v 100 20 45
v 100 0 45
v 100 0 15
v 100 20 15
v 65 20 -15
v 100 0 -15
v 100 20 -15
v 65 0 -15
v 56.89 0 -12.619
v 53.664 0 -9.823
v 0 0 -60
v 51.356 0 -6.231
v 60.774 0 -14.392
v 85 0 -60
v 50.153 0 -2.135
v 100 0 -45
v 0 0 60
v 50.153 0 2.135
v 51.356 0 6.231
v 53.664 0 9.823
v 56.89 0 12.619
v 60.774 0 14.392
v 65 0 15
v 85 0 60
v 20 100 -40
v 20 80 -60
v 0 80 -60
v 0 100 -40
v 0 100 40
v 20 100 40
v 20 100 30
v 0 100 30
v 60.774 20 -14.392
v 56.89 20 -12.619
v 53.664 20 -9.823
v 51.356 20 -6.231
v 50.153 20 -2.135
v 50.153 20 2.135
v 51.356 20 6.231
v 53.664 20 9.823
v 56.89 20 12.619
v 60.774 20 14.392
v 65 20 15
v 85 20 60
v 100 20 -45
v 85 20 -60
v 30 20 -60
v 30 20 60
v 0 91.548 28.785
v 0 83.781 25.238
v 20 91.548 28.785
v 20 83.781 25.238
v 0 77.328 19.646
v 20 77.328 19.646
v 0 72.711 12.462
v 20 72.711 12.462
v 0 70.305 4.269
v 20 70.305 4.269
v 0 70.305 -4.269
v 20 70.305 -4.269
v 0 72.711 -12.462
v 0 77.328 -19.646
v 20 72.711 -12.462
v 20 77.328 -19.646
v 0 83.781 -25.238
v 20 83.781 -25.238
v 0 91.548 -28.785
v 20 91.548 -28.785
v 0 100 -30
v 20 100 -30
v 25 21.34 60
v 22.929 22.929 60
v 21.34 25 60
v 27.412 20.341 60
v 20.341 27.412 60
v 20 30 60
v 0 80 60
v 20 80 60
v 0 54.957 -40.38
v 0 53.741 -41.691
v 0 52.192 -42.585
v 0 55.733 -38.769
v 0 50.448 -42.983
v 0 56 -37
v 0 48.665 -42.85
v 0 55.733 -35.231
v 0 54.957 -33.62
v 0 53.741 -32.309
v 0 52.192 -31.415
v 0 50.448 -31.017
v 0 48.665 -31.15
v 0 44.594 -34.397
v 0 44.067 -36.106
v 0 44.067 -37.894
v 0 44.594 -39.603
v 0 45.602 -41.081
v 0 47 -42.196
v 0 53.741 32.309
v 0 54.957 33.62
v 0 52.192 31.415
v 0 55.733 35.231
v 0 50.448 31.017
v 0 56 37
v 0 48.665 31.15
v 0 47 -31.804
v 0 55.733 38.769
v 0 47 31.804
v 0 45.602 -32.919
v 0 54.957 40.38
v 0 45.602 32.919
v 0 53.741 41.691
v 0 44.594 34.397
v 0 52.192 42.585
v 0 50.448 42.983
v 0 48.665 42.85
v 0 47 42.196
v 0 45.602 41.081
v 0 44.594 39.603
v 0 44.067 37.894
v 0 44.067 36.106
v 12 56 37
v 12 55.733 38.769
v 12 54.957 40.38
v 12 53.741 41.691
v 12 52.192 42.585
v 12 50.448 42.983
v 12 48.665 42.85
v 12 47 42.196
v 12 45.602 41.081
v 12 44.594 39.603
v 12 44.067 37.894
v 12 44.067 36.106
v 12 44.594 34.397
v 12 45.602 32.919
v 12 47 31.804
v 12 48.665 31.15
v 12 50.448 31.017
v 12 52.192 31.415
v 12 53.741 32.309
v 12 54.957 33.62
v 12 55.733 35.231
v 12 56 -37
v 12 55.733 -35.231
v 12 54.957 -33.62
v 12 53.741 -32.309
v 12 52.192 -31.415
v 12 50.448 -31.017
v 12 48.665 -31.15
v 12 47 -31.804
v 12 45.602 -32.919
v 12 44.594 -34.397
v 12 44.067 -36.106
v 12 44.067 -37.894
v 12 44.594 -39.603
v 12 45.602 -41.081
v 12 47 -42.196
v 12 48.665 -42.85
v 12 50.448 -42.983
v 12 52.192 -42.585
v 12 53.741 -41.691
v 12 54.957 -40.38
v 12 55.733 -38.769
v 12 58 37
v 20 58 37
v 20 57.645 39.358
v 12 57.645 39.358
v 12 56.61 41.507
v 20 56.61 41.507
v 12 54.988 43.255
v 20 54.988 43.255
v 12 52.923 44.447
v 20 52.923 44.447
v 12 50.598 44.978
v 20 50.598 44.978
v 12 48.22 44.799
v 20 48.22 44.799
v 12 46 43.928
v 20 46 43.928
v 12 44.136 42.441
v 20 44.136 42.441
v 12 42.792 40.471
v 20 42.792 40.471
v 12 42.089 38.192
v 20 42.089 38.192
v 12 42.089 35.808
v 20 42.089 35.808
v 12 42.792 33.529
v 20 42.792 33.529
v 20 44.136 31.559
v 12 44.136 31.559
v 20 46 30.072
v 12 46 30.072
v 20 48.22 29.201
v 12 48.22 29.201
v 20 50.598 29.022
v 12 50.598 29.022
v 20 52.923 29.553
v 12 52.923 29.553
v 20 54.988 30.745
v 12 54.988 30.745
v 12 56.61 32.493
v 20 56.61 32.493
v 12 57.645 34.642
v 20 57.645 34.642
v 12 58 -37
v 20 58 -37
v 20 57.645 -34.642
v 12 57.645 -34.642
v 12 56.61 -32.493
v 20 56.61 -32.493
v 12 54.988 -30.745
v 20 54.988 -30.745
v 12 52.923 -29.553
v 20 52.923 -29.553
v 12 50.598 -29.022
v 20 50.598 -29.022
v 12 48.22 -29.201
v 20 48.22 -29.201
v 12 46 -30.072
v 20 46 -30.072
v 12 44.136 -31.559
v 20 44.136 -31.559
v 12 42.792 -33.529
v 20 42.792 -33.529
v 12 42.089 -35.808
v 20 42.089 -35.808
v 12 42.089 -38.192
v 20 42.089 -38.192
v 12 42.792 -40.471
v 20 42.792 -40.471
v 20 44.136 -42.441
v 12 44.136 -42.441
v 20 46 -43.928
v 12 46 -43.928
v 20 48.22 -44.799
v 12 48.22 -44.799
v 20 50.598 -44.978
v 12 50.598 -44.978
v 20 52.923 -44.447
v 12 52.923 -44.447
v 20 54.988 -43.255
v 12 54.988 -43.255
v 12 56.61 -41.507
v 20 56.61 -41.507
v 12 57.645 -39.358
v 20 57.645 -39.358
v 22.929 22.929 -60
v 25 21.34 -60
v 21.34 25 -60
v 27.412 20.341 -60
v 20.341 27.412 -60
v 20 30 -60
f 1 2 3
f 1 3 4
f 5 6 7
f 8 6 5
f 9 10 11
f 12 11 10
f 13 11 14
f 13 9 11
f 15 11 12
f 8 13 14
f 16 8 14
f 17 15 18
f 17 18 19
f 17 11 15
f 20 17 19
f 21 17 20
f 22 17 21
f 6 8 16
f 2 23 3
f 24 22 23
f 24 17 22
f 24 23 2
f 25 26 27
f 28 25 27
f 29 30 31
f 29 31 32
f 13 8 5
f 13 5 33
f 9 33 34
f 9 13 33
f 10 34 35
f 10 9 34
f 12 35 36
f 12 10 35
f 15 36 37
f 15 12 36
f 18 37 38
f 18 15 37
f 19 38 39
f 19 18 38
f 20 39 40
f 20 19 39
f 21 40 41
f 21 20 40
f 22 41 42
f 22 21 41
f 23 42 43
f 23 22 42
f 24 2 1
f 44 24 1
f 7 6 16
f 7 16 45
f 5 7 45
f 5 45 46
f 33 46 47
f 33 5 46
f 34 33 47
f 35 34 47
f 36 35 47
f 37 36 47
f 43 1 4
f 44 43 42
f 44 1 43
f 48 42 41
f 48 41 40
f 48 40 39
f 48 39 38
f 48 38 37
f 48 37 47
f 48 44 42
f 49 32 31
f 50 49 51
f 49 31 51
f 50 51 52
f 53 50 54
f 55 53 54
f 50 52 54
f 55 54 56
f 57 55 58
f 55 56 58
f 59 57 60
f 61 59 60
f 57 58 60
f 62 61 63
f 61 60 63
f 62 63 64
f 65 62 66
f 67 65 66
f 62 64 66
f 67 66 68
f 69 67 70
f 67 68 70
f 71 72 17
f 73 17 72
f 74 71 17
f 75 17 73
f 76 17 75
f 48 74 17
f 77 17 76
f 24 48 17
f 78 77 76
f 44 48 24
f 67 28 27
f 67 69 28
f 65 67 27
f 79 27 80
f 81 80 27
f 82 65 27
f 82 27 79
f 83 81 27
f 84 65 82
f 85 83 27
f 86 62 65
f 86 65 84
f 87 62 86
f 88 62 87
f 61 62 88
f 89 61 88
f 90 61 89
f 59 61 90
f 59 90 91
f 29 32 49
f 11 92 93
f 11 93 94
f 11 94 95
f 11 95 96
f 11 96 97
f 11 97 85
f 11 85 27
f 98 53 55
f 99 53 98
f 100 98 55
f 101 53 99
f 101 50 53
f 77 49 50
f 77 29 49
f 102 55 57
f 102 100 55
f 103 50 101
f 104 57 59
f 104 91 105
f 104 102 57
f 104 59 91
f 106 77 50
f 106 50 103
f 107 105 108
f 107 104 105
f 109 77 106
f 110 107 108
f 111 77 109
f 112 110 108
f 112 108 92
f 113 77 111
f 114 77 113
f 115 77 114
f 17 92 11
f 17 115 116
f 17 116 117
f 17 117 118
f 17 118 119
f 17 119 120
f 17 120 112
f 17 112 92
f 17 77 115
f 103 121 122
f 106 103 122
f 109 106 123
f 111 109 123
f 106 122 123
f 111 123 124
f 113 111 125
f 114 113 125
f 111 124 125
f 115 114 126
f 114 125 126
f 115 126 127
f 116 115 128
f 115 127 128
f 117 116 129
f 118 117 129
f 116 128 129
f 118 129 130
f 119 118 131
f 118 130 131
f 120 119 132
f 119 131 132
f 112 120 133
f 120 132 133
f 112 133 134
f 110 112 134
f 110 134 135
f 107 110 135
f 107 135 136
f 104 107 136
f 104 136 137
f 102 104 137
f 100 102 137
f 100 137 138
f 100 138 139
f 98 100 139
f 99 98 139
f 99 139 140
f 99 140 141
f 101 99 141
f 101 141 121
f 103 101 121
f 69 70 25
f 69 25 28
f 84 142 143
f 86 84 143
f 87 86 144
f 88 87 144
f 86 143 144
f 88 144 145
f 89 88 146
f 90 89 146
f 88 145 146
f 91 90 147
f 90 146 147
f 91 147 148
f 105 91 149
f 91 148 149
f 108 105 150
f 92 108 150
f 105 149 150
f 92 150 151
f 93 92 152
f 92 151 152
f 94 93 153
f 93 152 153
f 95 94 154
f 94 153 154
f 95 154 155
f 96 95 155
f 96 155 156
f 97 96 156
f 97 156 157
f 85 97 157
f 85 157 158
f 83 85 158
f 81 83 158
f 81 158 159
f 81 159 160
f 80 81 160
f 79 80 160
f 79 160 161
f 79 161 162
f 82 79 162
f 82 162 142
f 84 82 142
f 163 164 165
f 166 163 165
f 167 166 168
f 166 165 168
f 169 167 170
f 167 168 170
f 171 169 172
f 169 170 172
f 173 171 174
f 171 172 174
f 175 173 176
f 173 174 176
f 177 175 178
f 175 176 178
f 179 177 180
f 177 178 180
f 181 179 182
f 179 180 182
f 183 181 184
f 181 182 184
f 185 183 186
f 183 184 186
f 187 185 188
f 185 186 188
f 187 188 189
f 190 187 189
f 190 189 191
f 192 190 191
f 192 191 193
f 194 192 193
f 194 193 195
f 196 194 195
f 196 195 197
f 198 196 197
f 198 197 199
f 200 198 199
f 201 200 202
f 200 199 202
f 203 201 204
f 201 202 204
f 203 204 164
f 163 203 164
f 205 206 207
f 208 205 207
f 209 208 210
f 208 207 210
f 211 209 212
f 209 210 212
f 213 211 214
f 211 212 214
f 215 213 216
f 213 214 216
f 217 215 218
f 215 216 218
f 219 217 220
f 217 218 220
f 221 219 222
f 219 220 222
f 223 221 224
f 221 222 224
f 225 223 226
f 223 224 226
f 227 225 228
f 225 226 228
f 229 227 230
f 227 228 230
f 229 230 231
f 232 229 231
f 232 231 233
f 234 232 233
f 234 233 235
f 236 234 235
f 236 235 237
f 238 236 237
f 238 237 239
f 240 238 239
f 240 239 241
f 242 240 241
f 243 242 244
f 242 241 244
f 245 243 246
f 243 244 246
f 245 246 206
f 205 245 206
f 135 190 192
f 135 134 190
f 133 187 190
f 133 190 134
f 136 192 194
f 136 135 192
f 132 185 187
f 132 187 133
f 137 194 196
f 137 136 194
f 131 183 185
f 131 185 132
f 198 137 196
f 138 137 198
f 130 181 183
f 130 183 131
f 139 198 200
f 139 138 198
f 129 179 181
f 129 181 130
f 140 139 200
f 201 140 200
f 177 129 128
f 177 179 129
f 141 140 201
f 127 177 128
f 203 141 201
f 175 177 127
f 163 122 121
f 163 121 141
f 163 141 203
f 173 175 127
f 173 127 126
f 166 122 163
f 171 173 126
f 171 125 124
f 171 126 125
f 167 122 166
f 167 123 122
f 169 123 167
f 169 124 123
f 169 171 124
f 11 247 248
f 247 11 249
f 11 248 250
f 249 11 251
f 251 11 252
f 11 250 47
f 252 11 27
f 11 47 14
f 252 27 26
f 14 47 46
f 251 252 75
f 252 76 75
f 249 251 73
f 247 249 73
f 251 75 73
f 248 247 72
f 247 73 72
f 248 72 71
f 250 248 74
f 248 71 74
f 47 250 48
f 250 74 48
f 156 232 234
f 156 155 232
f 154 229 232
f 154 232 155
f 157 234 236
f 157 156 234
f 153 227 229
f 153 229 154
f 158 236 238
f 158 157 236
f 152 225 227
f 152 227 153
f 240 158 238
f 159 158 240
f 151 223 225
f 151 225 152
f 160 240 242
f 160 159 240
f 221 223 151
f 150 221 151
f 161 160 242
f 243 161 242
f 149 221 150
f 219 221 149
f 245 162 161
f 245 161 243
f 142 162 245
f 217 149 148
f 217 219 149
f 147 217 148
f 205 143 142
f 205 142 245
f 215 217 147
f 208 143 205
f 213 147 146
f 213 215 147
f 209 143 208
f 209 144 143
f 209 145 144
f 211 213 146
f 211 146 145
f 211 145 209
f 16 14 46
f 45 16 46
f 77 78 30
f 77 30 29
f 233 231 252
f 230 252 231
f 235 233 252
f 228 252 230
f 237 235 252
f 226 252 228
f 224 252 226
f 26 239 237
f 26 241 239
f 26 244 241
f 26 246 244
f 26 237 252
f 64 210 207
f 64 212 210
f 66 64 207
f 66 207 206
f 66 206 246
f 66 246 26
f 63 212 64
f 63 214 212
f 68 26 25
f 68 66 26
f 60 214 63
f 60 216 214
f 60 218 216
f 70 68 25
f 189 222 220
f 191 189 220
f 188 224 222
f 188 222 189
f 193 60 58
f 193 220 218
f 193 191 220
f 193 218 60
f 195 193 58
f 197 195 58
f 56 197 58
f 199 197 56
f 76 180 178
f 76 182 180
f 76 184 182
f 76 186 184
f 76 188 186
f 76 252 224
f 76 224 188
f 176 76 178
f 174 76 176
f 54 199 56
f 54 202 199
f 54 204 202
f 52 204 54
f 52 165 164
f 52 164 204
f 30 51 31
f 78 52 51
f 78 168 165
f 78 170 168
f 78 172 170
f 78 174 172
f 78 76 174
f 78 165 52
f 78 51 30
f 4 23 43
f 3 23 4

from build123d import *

# Parameters (mm, degrees)
BOSS_EXTRUDE1_DEPTH     = 60
CHAMFER1_SIZE           = 15
CHAMFER2_SIZE           = 20
FILLET2_R               = 10
CUT_EXTRUDE1_REACH      = 143.421
SKETCH2_R               = 6
SKETCH2_3_R             = 8
SKETCH2_3_R_2           = 6
CUT_EXTRUDE2_DEPTH      = 8
CUT_EXTRUDE3_DEPTH      = 142.421356237
CUT_EXTRUDE3_DEPTH_BACK = 20


with BuildPart() as part:
    # Sketch1 → Boss-Extrude1 (new, symmetric)
    with BuildSketch(Plane.XY):
        Polygon((0, 0), (100, 0), (100, 20), (20, 20), (20, 100), (0, 100), align=None)
    extrude(amount=BOSS_EXTRUDE1_DEPTH, both=True)

    # Chamfer1
    chamfer1_edges = [part.edges().sort_by_distance(p)[0] for p in [
        (100, 10, 60),
        (100, 10, -60),
    ]]
    chamfer(chamfer1_edges, length=CHAMFER1_SIZE)

    # Chamfer2
    chamfer2_edges = [part.edges().sort_by_distance(p)[0] for p in [
        (10, 100, 60),
        (10, 100, -60),
    ]]
    chamfer(chamfer2_edges, length=CHAMFER2_SIZE)

    # Fillet2
    fillet2_edges = [part.edges().sort_by_distance(p)[0] for p in [
        (20, 20, 0),
    ]]
    fillet(fillet2_edges, radius=FILLET2_R)

    # Sketch2 → Cut-Extrude1 (cut, up to next)
    with BuildSketch(Plane(origin=(20, 0, 0), x_dir=(0, 0, -1), z_dir=(1, 0, 0)), mode=Mode.PRIVATE) as cut_extrude1_sk1:
        with Locations((-37, 50)):
            Circle(SKETCH2_R)
    cut_extrude1_tool1 = extrude(cut_extrude1_sk1.sketch, amount=-CUT_EXTRUDE1_REACH, mode=Mode.PRIVATE) & part.part
    # Sketch2 → Cut-Extrude1 (cut, up to next)
    with BuildSketch(Plane(origin=(20, 0, 0), x_dir=(0, 0, -1), z_dir=(1, 0, 0)), mode=Mode.PRIVATE) as cut_extrude1_sk2:
        with Locations((37, 50)):
            Circle(SKETCH2_R)
    cut_extrude1_tool2 = extrude(cut_extrude1_sk2.sketch, amount=-CUT_EXTRUDE1_REACH, mode=Mode.PRIVATE) & part.part
    # Sketch2 → Cut-Extrude1 (cut, up to next)
    with BuildSketch(Plane(origin=(20, 0, 0), x_dir=(0, 0, -1), z_dir=(1, 0, 0)), mode=Mode.PRIVATE) as cut_extrude1_sk3:
        with BuildLine():
            Line((30, 100), (-30, 100))
            ThreePointArc((-30, 100), (0, 70), (30, 100))
        make_face()
    cut_extrude1_tool3 = extrude(cut_extrude1_sk3.sketch, amount=-CUT_EXTRUDE1_REACH, mode=Mode.PRIVATE) & part.part
    add(cut_extrude1_tool1.solids().sort_by_distance((20, 50, 37))[0], mode=Mode.SUBTRACT)
    add(cut_extrude1_tool2.solids().sort_by_distance((20, 50, -37))[0], mode=Mode.SUBTRACT)
    add(cut_extrude1_tool3.solids().sort_by_distance((20, 87.267605, 0))[0], mode=Mode.SUBTRACT)

    # Sketch2<3> → Cut-Extrude2 (cut)
    # profile 1 of 2: a face of its own
    with BuildSketch(Plane(origin=(20, 0, 0), x_dir=(0, 0, -1), z_dir=(1, 0, 0))):
        with Locations((-37, 50)):
            Circle(SKETCH2_3_R)
        with Locations((-37, 50)):
            Circle(SKETCH2_3_R_2, mode=Mode.SUBTRACT)
    # profile 2 of 2: a face of its own
    with BuildSketch(Plane(origin=(20, 0, 0), x_dir=(0, 0, -1), z_dir=(1, 0, 0))):
        with Locations((37, 50)):
            Circle(SKETCH2_3_R)
        with Locations((37, 50)):
            Circle(SKETCH2_3_R_2, mode=Mode.SUBTRACT)
    extrude(amount=-CUT_EXTRUDE2_DEPTH, mode=Mode.SUBTRACT)

    # Sketch3 → Cut-Extrude3 (cut, two sides: drawn at the far end of the back side and taken through both)
    with BuildSketch(Plane(origin=(0, 20, 0), x_dir=(1, 0, 0), z_dir=(0, 1, 0)).offset(-CUT_EXTRUDE3_DEPTH_BACK)):
        with BuildLine():
            Line((360, 15), (100, 15))
            Line((100, 15), (65, 15))
            ThreePointArc((65, 15), (50, 0), (65, -15))
            Line((65, -15), (100, -15))
            Line((100, -15), (360, -15))
            Line((360, -15), (880, -15))
            Line((880, -15), (880, 15))
            Line((880, 15), (360, 15))
        make_face()
    extrude(amount=CUT_EXTRUDE3_DEPTH + CUT_EXTRUDE3_DEPTH_BACK, mode=Mode.SUBTRACT)


solid = part.part
